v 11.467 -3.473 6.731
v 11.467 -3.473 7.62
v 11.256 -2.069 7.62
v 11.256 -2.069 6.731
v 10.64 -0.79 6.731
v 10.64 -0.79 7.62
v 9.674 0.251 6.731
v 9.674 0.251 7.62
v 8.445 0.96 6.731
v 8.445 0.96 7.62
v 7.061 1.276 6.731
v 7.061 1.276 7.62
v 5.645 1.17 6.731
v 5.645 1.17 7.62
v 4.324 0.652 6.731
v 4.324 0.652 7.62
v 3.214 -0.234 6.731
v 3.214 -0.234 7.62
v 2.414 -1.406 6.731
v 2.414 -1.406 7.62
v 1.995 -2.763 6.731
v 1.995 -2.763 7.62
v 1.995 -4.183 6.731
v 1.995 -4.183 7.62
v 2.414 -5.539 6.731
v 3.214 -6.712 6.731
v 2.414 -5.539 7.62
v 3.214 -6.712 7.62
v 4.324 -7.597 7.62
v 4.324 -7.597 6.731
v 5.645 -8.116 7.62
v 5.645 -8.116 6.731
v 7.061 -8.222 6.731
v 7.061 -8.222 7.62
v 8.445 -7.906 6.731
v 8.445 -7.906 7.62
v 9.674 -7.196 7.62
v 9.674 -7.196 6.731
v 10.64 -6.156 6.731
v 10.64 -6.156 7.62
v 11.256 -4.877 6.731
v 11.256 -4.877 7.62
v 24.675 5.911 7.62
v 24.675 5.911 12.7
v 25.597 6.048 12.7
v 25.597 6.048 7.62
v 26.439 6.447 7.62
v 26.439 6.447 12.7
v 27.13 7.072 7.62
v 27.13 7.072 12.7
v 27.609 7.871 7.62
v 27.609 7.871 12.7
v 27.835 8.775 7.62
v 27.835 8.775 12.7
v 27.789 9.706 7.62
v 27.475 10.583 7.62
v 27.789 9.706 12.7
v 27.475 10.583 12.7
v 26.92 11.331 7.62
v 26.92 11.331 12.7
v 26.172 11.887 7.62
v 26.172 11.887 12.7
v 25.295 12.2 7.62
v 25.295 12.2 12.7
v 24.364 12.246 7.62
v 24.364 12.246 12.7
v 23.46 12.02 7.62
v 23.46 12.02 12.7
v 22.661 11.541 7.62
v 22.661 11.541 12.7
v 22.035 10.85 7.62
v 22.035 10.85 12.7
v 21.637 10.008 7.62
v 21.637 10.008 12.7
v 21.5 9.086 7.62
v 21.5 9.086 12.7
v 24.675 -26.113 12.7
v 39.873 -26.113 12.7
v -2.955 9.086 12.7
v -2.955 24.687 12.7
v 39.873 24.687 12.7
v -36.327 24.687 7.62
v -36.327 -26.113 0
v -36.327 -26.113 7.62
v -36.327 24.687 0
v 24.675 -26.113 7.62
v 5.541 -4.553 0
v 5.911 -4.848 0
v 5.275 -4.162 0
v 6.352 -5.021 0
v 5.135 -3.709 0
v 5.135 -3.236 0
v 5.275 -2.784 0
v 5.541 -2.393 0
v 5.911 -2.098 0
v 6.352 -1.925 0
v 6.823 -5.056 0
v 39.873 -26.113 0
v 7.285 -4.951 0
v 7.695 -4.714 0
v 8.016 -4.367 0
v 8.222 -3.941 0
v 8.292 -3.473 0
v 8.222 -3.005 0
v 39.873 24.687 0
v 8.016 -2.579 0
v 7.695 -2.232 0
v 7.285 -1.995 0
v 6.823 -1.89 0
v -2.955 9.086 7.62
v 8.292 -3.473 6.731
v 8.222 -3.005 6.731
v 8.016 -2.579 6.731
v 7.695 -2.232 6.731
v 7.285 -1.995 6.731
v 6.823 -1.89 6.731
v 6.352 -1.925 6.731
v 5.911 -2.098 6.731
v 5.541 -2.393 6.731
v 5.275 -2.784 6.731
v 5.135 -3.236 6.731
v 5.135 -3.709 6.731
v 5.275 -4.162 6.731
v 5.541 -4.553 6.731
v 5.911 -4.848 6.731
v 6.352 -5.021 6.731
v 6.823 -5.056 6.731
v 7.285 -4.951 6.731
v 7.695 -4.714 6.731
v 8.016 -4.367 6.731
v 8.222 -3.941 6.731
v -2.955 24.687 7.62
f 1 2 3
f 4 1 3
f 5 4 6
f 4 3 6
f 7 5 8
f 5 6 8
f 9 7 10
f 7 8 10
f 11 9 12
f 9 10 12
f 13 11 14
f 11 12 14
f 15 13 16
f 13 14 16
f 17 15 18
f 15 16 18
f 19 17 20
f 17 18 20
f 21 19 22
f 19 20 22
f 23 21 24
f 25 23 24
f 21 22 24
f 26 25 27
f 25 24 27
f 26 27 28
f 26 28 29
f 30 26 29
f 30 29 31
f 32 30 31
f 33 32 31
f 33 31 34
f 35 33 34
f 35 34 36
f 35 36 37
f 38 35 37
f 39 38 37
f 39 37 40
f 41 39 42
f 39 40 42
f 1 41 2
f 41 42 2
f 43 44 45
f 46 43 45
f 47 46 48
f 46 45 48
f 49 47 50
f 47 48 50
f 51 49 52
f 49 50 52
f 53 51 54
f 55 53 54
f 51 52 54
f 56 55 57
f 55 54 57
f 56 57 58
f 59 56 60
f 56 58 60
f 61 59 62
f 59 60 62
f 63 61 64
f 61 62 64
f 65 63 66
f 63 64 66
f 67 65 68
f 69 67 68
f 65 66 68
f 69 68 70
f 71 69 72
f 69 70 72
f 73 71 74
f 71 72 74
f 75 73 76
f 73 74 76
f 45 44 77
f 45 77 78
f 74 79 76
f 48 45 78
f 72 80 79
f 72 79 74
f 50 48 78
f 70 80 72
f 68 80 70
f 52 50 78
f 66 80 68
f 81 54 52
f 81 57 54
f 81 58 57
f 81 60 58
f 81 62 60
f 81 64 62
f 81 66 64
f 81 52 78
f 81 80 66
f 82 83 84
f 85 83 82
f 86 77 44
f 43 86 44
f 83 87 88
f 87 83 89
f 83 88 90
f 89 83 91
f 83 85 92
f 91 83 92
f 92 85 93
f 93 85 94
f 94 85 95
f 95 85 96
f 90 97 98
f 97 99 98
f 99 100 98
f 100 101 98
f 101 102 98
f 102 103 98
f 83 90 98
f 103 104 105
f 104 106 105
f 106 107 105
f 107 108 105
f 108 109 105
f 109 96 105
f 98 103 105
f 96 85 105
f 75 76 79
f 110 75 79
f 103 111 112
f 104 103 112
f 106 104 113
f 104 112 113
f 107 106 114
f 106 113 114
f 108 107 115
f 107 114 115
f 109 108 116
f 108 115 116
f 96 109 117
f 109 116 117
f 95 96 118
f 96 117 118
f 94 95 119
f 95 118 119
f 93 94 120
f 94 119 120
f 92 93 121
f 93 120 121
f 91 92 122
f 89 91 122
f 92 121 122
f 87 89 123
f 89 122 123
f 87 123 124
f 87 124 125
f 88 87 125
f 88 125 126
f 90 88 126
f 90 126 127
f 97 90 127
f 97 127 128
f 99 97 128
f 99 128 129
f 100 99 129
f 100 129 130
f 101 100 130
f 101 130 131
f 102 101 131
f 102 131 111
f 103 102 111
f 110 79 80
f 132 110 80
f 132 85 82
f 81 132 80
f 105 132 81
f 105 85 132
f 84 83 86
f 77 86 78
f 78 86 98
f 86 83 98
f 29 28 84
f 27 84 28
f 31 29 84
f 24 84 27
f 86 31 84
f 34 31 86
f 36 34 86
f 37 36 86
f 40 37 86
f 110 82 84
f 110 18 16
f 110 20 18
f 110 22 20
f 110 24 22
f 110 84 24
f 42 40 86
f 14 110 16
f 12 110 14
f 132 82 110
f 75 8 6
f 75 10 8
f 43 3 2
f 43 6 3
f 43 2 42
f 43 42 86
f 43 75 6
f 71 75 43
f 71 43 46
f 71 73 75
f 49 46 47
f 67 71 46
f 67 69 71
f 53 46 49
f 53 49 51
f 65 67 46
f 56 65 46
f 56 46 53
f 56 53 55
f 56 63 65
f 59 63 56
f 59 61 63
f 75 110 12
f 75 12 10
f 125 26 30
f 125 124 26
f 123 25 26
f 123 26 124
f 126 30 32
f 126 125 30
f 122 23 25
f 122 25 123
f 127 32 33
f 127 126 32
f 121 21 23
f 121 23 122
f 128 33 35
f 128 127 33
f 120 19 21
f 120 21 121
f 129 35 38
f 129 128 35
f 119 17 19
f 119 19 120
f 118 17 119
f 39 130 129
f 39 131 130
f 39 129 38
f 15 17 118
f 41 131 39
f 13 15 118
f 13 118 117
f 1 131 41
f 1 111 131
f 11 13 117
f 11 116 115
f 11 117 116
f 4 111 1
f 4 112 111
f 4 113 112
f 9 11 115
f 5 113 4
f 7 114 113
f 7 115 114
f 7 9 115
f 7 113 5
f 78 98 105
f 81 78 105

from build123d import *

# Parameters (mm, degrees)
F0_W     = 76.2
F0_H     = 50.8
F1_DEPTH = 12.7
F3_DEPTH = 5.08
F4_R     = 1.5875
F5_DEPTH = 25.4
F6_R     = 4.7625
F7_DEPTH = 0.889


with BuildPart() as f1:
    # F0 (on Top) → F1 (new body)
    with BuildSketch(Plane.XY):
        with Locations((1.773075, -0.713211)):
            Rectangle(F0_W, F0_H)
    extrude(amount=F1_DEPTH)

    # F2 (on face) → F3 (cut)
    with BuildSketch(Plane.XY.offset(12.7)):
        with BuildLine():
            Line((-2.955125, 9.086431), (-2.955125, 24.686789))
            Line((-2.955125, 24.686789), (-36.326925, 24.686789))
            Line((-36.326925, 24.686789), (-36.326925, -26.113211))
            Line((-36.326925, -26.113211), (24.675291, -26.113211))
            Line((24.675291, -26.113211), (24.675291, 5.911431))
            ThreePointArc((24.675291, 5.911431), (26.920355, 11.331495), (21.500291, 9.086431))
            Line((21.500291, 9.086431), (-2.955125, 9.086431))
        make_face()
    extrude(amount=-F3_DEPTH, mode=Mode.SUBTRACT)

    # F4 (on face) → F5 (cut)
    with BuildSketch(Plane.XY.offset(7.62)):
        with Locations((6.704791, -3.472849)):
            Circle(F4_R)
    extrude(amount=-F5_DEPTH, mode=Mode.SUBTRACT)

    # F6 (on face) → F7 (cut)
    with BuildSketch(Plane.XY.offset(7.62)):
        with Locations((6.704791, -3.472849)):
            Circle(F6_R)
    extrude(amount=-F7_DEPTH, mode=Mode.SUBTRACT)


solid = f1.part
